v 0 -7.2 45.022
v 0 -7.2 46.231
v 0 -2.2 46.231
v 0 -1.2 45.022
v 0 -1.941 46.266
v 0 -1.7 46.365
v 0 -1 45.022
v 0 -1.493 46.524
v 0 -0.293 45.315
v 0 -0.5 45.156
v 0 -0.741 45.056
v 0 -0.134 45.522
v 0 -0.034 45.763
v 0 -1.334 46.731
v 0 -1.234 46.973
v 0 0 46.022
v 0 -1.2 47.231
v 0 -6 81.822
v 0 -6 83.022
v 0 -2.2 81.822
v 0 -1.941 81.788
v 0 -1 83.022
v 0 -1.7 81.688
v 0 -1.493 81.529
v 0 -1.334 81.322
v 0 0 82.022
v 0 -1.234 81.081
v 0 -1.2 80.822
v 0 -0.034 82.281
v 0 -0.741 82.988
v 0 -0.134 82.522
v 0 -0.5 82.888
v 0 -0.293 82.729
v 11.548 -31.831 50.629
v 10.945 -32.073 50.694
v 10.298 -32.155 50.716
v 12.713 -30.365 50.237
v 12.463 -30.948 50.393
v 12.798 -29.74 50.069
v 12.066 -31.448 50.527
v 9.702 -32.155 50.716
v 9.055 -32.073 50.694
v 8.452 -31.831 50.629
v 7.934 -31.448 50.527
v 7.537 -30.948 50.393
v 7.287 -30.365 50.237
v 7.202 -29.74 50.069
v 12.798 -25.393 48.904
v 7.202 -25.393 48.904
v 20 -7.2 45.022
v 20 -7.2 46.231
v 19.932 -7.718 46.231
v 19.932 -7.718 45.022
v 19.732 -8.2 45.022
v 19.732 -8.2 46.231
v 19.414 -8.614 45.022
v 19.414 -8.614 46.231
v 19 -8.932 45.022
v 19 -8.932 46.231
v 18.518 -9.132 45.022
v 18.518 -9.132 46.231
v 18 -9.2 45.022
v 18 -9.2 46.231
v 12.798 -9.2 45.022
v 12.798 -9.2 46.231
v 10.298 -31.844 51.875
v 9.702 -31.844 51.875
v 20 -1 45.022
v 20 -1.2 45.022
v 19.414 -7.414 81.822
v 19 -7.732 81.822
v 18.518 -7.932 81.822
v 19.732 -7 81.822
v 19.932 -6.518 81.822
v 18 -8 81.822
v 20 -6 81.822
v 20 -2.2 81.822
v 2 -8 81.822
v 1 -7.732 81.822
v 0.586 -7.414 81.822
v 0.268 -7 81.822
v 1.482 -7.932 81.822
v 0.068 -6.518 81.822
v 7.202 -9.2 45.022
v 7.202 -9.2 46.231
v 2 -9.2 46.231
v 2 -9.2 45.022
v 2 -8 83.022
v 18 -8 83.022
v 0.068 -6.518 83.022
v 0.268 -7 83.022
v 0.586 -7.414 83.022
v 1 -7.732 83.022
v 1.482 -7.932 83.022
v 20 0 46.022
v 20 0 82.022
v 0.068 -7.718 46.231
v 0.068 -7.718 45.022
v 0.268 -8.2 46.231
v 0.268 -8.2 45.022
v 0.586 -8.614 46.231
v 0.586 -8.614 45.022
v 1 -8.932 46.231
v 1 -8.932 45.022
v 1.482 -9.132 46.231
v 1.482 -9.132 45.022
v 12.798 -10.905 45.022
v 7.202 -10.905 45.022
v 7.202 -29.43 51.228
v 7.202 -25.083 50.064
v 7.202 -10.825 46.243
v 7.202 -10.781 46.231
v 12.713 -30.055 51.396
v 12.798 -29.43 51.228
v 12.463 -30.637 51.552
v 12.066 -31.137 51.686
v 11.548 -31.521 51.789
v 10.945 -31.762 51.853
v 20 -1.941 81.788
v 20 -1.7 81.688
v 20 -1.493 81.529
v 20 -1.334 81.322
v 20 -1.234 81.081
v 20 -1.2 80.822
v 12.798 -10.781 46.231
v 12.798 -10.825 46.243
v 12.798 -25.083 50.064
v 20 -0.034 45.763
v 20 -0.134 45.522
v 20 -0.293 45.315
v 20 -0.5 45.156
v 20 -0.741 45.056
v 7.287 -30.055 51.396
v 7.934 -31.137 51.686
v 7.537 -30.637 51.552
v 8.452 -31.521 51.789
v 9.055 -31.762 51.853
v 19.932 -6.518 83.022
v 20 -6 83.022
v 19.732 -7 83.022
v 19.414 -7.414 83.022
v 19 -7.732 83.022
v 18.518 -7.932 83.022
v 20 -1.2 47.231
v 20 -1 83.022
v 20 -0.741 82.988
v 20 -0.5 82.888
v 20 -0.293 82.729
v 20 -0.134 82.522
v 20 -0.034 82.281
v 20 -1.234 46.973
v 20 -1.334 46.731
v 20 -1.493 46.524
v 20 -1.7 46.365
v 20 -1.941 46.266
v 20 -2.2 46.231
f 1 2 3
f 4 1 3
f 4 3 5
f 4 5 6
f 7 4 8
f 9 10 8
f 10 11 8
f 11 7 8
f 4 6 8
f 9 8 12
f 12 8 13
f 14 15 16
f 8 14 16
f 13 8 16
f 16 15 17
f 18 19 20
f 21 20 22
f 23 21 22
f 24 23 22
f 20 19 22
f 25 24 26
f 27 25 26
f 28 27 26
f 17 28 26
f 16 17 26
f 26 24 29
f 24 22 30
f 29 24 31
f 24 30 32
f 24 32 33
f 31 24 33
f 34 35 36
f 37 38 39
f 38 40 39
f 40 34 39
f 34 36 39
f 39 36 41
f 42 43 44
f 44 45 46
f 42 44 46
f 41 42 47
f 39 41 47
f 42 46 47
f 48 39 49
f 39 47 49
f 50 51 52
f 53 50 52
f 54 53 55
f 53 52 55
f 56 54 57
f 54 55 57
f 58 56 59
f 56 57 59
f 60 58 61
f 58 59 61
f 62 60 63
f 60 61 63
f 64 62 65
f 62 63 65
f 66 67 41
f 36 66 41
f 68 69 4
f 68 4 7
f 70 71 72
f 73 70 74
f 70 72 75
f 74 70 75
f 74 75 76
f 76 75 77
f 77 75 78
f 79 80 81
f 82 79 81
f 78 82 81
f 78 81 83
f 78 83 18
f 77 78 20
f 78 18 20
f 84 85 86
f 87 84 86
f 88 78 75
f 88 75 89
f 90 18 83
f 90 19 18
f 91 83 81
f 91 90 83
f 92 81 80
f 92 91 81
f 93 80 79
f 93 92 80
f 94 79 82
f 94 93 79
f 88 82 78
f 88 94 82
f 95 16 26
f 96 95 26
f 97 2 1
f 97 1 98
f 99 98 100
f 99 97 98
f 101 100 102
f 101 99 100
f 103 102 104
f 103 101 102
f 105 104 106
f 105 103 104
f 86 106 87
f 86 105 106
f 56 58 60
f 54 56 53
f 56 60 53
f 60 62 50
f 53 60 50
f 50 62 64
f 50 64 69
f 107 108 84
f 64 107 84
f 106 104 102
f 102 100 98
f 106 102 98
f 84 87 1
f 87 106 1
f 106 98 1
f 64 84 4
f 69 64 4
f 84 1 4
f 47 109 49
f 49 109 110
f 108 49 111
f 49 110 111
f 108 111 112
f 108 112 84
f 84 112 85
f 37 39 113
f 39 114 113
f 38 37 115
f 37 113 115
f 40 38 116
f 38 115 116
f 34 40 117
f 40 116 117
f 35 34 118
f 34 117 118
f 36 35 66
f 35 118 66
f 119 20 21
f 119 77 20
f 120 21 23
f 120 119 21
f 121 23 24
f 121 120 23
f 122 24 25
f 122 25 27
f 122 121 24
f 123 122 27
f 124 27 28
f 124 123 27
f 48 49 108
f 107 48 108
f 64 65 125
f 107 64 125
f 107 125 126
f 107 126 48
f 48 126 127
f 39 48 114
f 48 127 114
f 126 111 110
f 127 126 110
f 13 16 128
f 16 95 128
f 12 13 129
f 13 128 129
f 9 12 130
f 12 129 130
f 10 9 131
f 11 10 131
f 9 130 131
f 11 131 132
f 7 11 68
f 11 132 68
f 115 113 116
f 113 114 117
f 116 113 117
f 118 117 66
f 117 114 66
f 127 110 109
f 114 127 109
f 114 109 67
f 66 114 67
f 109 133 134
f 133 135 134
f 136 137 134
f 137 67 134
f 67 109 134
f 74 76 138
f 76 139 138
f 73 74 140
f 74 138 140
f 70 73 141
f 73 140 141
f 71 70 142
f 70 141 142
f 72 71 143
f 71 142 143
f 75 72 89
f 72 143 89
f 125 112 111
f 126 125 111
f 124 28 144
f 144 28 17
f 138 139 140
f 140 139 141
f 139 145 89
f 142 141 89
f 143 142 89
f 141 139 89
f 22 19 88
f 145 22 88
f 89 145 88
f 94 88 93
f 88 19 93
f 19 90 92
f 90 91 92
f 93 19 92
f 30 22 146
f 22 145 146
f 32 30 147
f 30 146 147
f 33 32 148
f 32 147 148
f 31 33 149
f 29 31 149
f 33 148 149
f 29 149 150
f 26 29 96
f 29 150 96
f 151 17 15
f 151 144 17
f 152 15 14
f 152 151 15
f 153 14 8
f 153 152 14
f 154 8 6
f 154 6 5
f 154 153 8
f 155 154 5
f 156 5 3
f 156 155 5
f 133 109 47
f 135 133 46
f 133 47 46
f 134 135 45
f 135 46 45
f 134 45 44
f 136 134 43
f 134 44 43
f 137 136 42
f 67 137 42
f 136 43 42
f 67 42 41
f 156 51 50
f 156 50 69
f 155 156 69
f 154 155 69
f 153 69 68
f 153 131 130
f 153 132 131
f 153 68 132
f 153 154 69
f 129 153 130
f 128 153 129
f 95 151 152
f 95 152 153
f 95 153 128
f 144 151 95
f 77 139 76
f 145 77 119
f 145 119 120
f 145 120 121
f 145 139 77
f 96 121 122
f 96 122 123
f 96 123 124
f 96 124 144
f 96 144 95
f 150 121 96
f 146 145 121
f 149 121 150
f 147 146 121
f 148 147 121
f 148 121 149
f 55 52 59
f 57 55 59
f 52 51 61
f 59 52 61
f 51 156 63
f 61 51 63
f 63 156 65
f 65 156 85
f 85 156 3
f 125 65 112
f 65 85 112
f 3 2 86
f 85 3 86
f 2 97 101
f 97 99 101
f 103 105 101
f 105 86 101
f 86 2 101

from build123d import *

# Parameters (mm, degrees)
F0_W     = 1.2
F0_H     = 1.2
F0_W_2   = 6.8
F0_H_2   = 35.5907311706
F0_H_3   = 1.2092688294
F1_DEPTH = 20
F3_DEPTH = 40.4
F4_R     = 2
F5_R     = 2.5
F6_R     = 2
F7_R     = 1


# Not quite as in the source:
# - ends of sketch curves that miss each other by under 0.0002 mm in the source are joined


with BuildPart() as f1:
    # F0 (on Right) → F1 (new body)
    with BuildSketch(Plane.YZ):
        with Locations((-0.6, 82.4221718073)):
            Rectangle(F0_W, F0_H)
        with Locations((-4.6, 82.4221718073)):
            Rectangle(F0_W_2, F0_H)
        with Locations((-0.6, 64.026806222)):
            Rectangle(F0_W, F0_H_2)
        with Locations((-0.6, 45.626806222)):
            Rectangle(F0_W, F0_H_3)
        Polygon((-1.2, 45.0221718073), (-1.2, 46.2314406367), (-10.7555877391, 46.2314406367), (-10.7812210649, 46.2314406367), (-10.8245881359, 46.2430607959), (-25.0829152046, 50.0635639224), (-31.8443964743, 51.8752954254), (-32.1549790177, 50.7161843506), (-25.393497748, 48.9044528476), (-10.9046093128, 45.0221710554), align=None)
    extrude(amount=F1_DEPTH)

    # F2 (on face) → F3 (cut)
    with BuildSketch(Plane.XY.offset(83.0221718073)):
        Polygon((7.2019821778, -9.2), (-6.1580585316, -9.2), (-6.1580585316, -39.2), (25.7106479257, -39.2), (25.7106479257, -9.2), (12.7980178222, -9.2), (12.7980178222, -35.1533853561), (7.2019821778, -35.1533853561), align=None)
    extrude(amount=-F3_DEPTH, mode=Mode.SUBTRACT)

    # F4
    f4_edges = [f1.edges().sort_by_distance(p)[0] for p in [
        (0, -9.2, 45.626806),
        (20, -9.2, 45.626806),
    ]]
    fillet(f4_edges, radius=F4_R)

    # F5
    f5_edges = [f1.edges().sort_by_distance(p)[0] for p in [
        (12.798018, -31.999688, 51.29574),
        (7.201982, -31.999688, 51.29574),
    ]]
    fillet(f5_edges, radius=F5_R)

    # F6
    f6_edges = [f1.edges().sort_by_distance(p)[0] for p in [
        (20, -8, 82.422172),
        (0, -8, 82.422172),
    ]]
    fillet(f6_edges, radius=F6_R)

    # F7
    f7_edges = [f1.edges().sort_by_distance(p)[0] for p in [
        (10, -1.2, 46.231441),
        (10, 0, 45.022172),
        (10, 0, 83.022172),
        (10, -1.2, 81.822172),
    ]]
    fillet(f7_edges, radius=F7_R)


solid = f1.part
